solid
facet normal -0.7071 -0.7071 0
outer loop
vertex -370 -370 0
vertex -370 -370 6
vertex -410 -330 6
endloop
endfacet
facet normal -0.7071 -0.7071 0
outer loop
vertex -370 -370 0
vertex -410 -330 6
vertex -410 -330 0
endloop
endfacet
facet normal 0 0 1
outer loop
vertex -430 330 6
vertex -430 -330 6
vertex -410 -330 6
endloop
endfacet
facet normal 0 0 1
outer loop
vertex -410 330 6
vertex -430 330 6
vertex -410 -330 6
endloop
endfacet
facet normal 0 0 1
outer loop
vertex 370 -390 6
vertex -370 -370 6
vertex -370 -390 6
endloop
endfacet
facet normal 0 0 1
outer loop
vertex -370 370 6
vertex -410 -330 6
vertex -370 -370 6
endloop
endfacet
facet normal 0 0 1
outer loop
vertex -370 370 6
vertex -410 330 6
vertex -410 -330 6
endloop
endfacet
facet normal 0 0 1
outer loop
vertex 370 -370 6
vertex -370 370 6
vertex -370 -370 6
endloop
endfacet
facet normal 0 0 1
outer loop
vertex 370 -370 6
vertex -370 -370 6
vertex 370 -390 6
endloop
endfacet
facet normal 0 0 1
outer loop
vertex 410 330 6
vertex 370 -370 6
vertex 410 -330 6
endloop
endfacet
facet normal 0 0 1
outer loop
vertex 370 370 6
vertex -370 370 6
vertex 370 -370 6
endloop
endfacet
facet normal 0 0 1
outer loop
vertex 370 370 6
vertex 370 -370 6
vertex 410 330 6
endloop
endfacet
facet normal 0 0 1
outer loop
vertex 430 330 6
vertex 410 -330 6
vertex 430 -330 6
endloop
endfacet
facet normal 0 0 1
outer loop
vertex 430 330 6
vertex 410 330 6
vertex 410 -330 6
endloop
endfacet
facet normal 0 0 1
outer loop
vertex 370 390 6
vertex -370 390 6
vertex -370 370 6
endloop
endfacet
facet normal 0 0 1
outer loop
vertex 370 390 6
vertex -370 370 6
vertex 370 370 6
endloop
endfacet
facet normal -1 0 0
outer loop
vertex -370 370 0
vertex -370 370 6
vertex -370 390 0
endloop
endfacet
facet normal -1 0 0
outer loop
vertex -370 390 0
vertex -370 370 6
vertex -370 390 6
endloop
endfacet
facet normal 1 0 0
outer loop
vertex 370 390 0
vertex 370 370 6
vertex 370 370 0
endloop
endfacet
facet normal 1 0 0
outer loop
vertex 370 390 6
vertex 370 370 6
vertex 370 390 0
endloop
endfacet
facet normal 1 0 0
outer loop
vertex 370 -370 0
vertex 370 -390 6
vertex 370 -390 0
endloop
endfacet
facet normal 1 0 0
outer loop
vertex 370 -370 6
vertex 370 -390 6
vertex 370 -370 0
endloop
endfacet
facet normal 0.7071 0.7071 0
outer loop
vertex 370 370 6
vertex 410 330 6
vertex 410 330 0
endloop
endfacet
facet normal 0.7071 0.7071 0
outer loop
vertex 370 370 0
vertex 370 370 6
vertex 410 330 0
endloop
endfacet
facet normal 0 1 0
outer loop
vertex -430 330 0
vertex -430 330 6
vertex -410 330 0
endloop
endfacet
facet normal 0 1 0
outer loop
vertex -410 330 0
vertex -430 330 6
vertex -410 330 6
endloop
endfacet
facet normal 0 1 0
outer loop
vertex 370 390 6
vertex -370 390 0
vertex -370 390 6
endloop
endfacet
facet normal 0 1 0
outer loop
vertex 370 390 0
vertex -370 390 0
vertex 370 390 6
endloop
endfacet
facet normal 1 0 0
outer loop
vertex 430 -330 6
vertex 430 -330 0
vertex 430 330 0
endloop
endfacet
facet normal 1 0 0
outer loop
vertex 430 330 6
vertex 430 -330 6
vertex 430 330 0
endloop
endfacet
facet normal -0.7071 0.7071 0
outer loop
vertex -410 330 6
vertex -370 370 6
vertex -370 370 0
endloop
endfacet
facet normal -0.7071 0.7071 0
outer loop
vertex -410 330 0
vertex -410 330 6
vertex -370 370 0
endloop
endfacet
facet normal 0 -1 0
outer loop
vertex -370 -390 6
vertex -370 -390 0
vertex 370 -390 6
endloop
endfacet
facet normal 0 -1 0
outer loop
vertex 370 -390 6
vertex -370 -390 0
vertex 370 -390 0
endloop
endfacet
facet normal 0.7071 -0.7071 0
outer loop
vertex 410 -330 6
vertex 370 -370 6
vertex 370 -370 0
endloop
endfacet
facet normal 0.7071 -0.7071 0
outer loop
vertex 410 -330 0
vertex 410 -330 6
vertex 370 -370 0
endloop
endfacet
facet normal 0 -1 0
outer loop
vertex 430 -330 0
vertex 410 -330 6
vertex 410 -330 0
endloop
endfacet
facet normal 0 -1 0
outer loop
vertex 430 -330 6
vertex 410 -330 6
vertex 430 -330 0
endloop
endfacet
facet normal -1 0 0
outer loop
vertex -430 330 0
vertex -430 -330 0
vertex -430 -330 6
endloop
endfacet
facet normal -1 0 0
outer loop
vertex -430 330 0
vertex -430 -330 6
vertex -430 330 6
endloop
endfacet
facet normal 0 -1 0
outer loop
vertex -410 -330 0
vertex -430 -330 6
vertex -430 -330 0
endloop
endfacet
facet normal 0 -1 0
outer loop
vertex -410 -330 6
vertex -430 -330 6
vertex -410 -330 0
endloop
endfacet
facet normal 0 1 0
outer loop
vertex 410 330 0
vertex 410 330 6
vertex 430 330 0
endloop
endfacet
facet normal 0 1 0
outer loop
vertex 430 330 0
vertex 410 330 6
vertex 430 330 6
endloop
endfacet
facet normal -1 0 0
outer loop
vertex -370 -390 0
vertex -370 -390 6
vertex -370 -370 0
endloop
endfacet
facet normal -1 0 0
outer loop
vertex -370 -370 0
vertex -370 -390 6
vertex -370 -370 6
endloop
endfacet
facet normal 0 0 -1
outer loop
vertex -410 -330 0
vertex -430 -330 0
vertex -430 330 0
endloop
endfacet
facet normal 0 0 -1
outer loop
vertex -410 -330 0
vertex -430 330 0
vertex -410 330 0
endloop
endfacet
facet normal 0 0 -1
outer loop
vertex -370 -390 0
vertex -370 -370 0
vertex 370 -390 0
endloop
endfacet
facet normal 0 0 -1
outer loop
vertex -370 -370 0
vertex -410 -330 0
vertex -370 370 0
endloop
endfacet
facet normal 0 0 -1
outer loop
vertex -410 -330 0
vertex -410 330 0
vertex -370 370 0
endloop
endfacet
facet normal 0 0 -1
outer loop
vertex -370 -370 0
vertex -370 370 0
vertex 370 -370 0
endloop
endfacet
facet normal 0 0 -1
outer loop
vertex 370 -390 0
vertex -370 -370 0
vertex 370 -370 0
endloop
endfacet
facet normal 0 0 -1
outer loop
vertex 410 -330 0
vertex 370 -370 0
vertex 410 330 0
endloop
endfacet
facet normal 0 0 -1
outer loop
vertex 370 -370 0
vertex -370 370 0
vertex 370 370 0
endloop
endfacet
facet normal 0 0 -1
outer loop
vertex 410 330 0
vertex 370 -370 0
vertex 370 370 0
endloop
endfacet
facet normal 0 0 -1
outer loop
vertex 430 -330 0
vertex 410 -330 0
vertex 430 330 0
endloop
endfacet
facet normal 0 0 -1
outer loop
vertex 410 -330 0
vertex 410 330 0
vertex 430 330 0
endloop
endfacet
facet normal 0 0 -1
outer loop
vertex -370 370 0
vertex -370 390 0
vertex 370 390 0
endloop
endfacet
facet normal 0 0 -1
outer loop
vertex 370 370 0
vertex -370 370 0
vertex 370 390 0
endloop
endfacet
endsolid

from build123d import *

# Parameters (mm, degrees)
SKETCH1_W           = 860
SKETCH1_H           = 780
BOSS_EXTRUDE1_DEPTH = 6
SKETCH2_W           = 60
SKETCH2_H           = 60
CUT_EXTRUDE1_DEPTH  = 6
CHAMFER1_SIZE       = 40


with BuildPart() as part:
    # Sketch1 → Boss-Extrude1 (new body)
    with BuildSketch(Plane.XY):
        Rectangle(SKETCH1_W, SKETCH1_H)
    extrude(amount=BOSS_EXTRUDE1_DEPTH)

    # Sketch2 → Cut-Extrude1 (cut)
    with BuildSketch(Plane.XY.offset(6)):
        with Locations((-400, 360)):
            Rectangle(SKETCH2_W, SKETCH2_H)
        with Locations((400, 360)):
            Rectangle(SKETCH2_W, SKETCH2_H)
        with Locations((400, -360)):
            Rectangle(SKETCH2_W, SKETCH2_H)
        with Locations((-400, -360)):
            Rectangle(SKETCH2_W, SKETCH2_H)
    extrude(amount=-CUT_EXTRUDE1_DEPTH, mode=Mode.SUBTRACT)

    # Chamfer1
    chamfer1_edges = [part.edges().sort_by_distance(p)[0] for p in [
        (-370, -330, 3),
        (370, -330, 3),
        (370, 330, 3),
        (-370, 330, 3),
    ]]
    chamfer(chamfer1_edges, length=CHAMFER1_SIZE)


solid = part.part
